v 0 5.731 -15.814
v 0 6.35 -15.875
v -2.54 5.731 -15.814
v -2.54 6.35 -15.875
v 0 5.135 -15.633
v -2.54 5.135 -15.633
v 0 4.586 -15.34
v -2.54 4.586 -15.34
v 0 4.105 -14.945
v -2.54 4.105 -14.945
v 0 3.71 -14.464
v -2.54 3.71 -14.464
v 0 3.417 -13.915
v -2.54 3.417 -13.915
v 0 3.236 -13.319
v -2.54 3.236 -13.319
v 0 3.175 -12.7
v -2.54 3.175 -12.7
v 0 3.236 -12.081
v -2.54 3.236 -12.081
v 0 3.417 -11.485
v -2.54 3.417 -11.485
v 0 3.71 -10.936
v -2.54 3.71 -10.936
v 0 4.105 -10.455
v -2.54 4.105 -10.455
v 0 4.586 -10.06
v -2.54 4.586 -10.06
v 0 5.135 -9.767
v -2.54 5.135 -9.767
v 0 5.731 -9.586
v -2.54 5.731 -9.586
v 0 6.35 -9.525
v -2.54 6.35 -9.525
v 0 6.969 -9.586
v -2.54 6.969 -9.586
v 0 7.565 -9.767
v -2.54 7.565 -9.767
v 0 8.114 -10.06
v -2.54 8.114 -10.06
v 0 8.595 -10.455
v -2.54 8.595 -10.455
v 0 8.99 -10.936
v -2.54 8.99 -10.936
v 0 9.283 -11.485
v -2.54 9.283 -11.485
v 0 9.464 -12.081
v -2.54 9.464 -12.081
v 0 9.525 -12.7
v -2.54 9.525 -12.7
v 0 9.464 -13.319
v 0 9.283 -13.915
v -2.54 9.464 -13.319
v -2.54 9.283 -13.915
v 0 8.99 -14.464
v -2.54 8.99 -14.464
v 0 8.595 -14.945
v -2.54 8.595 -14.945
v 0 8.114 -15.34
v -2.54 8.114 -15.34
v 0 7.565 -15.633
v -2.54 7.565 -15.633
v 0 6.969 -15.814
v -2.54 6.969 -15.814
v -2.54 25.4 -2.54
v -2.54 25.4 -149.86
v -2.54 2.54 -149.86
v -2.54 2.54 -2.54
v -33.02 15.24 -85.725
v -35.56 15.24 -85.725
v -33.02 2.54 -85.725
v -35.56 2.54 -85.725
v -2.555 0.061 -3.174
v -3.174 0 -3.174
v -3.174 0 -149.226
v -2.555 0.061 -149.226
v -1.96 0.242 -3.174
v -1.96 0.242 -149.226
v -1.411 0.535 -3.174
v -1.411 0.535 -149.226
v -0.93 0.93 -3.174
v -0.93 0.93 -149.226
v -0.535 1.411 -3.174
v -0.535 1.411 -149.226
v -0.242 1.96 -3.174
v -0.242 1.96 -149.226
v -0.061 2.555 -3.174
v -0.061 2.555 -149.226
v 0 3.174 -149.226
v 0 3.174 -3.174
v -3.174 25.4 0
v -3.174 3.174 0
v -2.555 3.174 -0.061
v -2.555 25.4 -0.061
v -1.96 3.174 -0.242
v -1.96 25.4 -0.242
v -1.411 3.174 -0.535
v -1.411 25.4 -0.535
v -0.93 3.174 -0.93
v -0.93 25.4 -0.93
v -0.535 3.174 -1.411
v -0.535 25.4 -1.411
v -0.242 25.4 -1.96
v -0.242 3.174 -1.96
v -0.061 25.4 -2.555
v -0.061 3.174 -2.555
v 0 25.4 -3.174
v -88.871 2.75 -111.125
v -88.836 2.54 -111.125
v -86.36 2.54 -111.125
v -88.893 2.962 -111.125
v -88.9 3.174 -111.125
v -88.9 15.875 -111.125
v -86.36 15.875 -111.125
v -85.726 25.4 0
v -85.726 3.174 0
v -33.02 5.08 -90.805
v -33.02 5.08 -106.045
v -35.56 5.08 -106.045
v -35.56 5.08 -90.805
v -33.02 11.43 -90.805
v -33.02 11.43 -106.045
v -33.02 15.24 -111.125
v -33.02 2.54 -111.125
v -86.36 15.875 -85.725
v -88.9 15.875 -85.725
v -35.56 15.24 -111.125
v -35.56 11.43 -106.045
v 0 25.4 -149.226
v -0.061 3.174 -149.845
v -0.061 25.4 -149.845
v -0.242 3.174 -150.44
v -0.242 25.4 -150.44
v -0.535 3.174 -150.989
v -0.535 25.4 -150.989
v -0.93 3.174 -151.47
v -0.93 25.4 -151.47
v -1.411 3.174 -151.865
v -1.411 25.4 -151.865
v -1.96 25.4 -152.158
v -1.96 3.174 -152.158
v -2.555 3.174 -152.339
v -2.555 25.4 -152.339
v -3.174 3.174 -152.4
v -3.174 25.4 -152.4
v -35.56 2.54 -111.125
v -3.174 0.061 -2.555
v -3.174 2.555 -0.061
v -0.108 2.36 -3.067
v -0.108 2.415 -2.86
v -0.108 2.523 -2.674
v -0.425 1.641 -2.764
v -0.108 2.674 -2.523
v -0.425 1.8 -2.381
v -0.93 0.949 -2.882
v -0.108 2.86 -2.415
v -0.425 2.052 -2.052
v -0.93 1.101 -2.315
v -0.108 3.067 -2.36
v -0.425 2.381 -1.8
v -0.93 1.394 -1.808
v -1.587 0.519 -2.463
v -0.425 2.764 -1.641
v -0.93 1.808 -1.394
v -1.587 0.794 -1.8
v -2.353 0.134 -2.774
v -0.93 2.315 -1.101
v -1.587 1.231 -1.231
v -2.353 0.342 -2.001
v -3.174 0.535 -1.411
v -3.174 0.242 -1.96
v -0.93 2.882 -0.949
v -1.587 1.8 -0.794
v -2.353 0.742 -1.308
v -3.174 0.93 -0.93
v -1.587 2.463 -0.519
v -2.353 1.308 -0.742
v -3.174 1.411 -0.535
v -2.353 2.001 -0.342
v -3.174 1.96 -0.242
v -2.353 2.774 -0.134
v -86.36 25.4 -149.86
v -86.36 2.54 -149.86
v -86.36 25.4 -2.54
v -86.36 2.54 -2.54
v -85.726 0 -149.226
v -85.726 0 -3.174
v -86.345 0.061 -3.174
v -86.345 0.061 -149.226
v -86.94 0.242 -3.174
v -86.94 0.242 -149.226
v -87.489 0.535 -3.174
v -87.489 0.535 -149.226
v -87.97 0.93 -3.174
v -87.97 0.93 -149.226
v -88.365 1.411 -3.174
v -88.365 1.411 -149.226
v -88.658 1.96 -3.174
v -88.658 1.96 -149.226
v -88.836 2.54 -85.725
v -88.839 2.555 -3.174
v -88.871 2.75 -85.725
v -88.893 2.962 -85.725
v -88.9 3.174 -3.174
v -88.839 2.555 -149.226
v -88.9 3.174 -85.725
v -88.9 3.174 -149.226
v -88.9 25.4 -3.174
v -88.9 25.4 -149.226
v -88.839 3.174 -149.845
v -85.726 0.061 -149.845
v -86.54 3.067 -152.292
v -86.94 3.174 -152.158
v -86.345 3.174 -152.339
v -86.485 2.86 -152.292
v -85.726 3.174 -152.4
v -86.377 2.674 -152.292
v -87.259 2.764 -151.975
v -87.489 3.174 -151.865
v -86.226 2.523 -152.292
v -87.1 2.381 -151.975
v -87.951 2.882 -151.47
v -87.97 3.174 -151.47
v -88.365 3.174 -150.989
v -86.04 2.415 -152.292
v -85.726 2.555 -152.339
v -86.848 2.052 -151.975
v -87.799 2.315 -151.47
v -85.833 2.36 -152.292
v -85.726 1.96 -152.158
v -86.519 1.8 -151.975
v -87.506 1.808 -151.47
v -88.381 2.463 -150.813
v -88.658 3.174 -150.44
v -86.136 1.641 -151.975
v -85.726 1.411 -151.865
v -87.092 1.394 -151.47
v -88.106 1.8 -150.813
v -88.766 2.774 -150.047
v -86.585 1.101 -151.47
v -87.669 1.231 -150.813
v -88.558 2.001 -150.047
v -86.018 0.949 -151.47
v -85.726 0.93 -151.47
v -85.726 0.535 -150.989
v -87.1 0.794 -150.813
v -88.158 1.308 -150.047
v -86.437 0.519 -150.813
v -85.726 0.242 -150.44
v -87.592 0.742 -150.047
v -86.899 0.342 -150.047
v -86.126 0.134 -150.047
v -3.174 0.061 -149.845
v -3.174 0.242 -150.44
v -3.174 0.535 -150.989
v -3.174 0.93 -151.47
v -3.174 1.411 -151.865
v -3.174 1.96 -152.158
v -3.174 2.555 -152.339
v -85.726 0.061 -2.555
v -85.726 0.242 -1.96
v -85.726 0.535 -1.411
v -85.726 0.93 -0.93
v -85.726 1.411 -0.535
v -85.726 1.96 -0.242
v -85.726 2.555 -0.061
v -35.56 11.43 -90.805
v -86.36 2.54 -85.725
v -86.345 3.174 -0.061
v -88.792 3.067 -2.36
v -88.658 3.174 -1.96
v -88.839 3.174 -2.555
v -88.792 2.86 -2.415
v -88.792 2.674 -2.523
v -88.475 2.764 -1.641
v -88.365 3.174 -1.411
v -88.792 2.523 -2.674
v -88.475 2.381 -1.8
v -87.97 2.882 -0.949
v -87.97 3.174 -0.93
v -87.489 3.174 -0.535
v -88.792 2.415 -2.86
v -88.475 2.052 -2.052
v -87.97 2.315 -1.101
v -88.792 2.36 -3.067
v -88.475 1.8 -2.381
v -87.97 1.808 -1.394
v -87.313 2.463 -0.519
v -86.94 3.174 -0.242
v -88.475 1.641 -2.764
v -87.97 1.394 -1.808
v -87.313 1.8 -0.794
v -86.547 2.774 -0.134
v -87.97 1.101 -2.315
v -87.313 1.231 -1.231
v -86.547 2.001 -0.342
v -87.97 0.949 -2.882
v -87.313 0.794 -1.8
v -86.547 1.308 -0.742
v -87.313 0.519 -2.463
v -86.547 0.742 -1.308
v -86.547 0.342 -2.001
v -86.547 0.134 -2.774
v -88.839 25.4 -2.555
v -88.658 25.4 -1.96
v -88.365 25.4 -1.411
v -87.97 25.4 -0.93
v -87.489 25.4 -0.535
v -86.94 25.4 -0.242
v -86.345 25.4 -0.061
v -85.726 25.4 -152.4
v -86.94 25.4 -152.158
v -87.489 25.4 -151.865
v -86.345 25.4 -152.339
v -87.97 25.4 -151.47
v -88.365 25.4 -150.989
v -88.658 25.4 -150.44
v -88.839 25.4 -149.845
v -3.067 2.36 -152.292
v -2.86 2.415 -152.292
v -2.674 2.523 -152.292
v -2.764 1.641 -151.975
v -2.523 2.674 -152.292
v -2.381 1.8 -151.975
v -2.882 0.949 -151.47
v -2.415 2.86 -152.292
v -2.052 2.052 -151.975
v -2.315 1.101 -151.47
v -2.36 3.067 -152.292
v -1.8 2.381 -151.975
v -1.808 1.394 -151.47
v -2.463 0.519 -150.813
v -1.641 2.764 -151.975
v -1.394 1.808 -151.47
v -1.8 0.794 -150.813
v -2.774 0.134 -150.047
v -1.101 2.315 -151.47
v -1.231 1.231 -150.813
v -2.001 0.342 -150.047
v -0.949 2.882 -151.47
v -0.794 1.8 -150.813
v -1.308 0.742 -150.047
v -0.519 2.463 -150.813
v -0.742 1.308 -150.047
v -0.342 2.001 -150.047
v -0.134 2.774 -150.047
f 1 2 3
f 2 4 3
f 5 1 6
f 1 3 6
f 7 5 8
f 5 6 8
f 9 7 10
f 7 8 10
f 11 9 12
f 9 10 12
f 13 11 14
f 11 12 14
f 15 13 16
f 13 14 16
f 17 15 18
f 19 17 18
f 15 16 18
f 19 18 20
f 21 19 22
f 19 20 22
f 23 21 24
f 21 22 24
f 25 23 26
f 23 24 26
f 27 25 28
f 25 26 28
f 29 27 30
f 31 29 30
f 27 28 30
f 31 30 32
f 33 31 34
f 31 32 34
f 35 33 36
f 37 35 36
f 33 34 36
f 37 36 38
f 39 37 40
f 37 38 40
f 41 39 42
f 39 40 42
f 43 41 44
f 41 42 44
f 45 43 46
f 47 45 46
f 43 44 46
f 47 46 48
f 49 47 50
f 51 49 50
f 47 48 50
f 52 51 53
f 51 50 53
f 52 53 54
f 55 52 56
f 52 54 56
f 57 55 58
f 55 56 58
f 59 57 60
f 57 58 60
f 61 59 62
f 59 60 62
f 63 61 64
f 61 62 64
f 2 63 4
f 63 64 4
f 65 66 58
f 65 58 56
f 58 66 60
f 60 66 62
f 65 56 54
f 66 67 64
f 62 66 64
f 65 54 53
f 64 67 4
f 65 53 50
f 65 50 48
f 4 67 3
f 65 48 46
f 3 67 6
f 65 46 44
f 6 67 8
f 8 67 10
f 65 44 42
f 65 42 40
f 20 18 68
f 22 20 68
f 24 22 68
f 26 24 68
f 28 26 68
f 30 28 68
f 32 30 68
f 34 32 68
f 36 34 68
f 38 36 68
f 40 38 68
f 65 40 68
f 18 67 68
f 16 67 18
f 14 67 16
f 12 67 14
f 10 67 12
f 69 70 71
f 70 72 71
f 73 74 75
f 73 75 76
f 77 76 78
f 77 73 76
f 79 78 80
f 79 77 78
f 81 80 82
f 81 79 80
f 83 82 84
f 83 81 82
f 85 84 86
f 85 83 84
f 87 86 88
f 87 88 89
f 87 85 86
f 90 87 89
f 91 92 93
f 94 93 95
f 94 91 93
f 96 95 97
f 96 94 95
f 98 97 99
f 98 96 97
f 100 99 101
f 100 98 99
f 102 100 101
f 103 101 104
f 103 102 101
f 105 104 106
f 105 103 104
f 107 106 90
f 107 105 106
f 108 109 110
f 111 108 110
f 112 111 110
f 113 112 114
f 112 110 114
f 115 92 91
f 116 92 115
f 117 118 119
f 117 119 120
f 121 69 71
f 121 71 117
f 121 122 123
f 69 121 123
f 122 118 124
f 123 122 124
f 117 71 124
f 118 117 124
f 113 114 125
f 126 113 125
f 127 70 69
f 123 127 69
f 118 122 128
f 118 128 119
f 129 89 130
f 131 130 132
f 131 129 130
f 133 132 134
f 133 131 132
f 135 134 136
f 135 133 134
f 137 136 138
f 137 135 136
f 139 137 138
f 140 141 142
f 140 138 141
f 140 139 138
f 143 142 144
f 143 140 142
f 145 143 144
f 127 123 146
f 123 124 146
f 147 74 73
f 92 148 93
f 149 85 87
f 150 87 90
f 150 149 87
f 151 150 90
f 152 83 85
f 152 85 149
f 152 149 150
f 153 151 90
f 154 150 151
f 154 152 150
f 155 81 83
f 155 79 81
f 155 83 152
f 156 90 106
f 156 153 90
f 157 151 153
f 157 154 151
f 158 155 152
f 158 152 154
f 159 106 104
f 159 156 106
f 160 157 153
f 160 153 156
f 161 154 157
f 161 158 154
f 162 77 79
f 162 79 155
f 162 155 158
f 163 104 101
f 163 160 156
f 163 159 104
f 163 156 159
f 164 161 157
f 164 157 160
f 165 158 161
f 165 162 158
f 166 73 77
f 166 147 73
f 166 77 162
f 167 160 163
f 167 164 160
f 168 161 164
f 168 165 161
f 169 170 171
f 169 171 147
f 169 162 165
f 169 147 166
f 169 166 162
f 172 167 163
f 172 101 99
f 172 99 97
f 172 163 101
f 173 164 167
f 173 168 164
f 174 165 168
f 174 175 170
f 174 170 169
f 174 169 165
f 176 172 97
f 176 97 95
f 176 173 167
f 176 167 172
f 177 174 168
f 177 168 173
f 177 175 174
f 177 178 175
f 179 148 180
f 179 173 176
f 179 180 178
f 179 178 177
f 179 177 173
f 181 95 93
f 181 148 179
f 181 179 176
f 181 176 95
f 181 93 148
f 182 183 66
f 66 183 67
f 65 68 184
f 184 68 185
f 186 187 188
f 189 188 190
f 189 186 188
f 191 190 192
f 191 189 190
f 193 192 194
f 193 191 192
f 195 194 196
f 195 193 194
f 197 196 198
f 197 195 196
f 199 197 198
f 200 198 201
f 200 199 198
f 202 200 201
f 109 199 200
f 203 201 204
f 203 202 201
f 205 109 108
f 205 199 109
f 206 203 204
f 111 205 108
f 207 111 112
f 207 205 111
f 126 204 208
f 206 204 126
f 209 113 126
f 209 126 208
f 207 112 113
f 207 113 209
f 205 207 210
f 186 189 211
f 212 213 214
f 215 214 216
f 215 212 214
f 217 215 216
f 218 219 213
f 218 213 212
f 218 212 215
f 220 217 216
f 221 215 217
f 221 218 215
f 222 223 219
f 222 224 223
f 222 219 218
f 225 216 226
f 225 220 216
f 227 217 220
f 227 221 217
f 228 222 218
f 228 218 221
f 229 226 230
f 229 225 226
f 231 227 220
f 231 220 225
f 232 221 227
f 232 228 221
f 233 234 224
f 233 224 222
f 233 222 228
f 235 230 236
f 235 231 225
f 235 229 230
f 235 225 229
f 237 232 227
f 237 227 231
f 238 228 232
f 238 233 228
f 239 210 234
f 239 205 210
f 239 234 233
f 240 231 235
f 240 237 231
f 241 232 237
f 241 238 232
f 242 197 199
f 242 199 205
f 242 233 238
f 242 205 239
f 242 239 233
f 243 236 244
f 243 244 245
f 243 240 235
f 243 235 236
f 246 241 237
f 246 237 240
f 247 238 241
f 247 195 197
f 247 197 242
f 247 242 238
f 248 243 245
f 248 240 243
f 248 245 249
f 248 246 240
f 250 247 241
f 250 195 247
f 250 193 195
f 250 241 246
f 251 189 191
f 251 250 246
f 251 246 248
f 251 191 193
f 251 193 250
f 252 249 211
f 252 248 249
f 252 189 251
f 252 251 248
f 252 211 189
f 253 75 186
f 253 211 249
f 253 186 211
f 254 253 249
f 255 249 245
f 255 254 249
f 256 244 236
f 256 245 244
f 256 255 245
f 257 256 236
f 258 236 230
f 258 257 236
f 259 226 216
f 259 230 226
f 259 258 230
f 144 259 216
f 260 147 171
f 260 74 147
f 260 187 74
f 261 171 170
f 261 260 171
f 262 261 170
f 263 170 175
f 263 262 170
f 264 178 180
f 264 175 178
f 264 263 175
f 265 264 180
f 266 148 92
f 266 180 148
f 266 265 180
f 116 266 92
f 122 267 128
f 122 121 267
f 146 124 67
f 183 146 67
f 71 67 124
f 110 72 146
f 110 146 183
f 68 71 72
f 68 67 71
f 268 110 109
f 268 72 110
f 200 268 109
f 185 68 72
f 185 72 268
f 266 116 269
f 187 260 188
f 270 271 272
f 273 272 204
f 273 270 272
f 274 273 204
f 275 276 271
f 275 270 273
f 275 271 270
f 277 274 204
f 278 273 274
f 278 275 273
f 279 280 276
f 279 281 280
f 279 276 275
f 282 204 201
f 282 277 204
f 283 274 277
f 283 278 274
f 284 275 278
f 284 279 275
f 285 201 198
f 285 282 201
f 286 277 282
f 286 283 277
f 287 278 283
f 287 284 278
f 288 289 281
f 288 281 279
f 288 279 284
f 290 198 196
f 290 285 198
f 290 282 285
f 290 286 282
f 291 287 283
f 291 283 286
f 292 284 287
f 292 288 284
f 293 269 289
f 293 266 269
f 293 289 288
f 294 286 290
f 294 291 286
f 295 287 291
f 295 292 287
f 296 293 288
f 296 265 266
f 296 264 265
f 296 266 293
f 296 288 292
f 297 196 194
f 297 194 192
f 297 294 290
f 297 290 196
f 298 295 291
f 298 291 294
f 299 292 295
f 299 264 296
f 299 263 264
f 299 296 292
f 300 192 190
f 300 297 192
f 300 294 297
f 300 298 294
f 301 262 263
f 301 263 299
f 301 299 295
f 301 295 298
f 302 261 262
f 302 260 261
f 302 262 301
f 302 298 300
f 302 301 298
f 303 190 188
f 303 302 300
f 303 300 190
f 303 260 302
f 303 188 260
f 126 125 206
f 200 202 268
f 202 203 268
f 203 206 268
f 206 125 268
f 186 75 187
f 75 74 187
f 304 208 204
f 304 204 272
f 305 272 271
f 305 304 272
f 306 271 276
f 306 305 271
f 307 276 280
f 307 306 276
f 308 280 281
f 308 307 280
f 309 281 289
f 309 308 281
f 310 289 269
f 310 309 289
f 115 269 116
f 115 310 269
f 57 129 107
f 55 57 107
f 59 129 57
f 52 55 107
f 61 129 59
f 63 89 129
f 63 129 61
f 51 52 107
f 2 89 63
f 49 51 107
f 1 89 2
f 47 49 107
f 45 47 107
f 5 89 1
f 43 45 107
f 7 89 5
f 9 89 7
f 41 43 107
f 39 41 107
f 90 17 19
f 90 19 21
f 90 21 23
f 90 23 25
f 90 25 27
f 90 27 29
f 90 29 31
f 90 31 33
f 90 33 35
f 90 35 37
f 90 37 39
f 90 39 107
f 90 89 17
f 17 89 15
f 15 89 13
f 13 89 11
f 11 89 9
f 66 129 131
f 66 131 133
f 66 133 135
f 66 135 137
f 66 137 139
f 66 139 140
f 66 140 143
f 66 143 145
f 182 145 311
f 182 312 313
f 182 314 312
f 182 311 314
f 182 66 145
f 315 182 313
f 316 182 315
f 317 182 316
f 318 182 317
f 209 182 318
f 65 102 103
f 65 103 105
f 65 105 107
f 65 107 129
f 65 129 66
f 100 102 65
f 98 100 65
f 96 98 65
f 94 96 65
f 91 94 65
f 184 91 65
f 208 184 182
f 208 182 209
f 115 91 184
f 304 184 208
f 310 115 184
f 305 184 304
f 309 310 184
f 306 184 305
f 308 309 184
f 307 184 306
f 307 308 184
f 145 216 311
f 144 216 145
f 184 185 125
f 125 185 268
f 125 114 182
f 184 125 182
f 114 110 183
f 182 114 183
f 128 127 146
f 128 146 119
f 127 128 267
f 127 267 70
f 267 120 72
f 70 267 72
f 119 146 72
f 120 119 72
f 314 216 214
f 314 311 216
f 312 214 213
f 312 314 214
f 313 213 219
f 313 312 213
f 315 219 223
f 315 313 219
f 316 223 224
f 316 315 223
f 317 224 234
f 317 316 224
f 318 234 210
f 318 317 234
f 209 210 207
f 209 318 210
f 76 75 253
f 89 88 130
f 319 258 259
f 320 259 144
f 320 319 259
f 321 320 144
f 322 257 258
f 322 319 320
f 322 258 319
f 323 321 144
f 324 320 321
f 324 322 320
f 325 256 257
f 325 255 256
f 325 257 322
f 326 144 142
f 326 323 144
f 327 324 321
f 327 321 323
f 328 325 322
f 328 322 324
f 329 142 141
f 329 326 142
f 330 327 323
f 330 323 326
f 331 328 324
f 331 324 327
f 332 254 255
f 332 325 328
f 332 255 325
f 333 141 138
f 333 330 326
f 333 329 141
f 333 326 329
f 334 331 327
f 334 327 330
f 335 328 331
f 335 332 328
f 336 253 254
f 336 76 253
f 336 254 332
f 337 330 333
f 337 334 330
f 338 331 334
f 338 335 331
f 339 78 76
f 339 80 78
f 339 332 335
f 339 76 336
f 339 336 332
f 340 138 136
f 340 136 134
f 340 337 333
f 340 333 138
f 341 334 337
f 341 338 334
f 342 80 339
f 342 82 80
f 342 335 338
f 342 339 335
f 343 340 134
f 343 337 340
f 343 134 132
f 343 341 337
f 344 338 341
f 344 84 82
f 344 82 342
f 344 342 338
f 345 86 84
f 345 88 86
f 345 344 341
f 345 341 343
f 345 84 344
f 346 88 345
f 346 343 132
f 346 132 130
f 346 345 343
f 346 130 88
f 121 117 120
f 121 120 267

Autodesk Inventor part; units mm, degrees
ref_plane "YZ Plane" through (0, 0, 0) normal (1, 0, 0) x (0, 1, 0)
ref_plane "XZ Plane" through (0, 0, 0) normal (0, 1, 0) x (-1, 0, 0)
ref_plane "XY Plane" through (0, 0, 0) normal (0, 0, 1) x (1, 0, 0)
sketch "Sketch1" plane through (0, 0, 0) normal (0, 1, 0) x (-1, 0, 0)
  line L0 (0, 0) -> (88.9, 0)
  line L1 (88.9, 0) -> (88.9, -152.4)
  line L2 (88.9, -152.4) -> (0, -152.4)
  line L3 (0, -152.4) -> (0, 0)
  dimension "d0" = 88.9
  dimension "d1" = 152.4
extrude "Extrusion1" add sketch "Sketch1" along normal blind 25.4
shell "Shell1" thickness 2.54 removed faces 1 at (-59.2667, 25.4, -101.6)
sketch "Sketch2" plane through (-86.36, 2.54, -149.86) normal (1, 0, 0) x (0, 0, -1)
  point P0 (-149.86, -2.54)
sketch "Sketch7" plane through (0, 0, 0) normal (1, 0, 0) x (0, 0, -1)
  line L0 (152.4, 0) -> (0, 0) projected
  line L1 (0, 0) -> (0, 6.35)
  line L2 (0, 0) -> (0, 25.4) projected
  line L3 (0, 6.35) -> (12.7, 6.35)
  dimension "d21" = 6.35
  dimension "d22" = 12.7
  dimension "d23" = 90
hole "Hole1" at (0, 6.35, -12.7) direction (-1, 0, 0) diameter 6.35 depth 2.54 tip angle 118
fillet "Fillet2" radius 3.175 8 edges at (-44.45, 0, 0) (0, 12.7, 0) (0, 0, -76.2) (-88.9, 12.7, 0) (-88.9, 0, -76.2) (-44.45, 0, -152.4) (-88.9, 12.7, -152.4) (0, 12.7, -152.4)
sketch "Sketch9" plane through (-86.36, 2.54, -149.86) normal (1, 0, 0) x (0, 0, -1)
  line L0 (-0.635, 0.635) -> (-0.635, 22.86) projected
  line L1 (-0.635, 0.635) -> (-38.735, 0.635)
  line L2 (0, 0) -> (-147.32, 0) projected
  line L3 (-0.635, 0.635) -> (37.465, 0.635) construction
  line L4 (-38.735, 0.635) -> (-64.135, 0.635)
  line L5 (-64.135, 0.635) -> (-38.735, 0.635)
  line L6 (-38.735, 0.635) -> (-38.735, 13.335)
  line L7 (-38.735, 13.335) -> (-64.135, 13.335)
  line L8 (-64.135, 13.335) -> (-64.135, 0.635)
  point P0 (-149.86, -2.54)
  point P1 (-38.735, 0.635)
  dimension "d39" = 38.1
  dimension "d40" = 180
  dimension "d41" = 25.4
  dimension "d42" = 180
  dimension "d43" = 25.4
  dimension "d44" = 12.7
extrude "Extrusion7" cut sketch "Sketch9" against normal blind 5.08
sketch "Sketch10" plane through (-86.36, 2.54, -149.86) normal (1, 0, 0) x (0, 0, -1)
  line L0 (-38.735, 13.335) -> (-38.735, 0.635) projected
  line L1 (-38.735, 0.635) -> (-64.135, 0.635)
  line L2 (-64.135, 0.635) -> (-64.135, 0)
  line L3 (-64.135, 0) -> (-38.735, 0)
  line L4 (-38.735, 0) -> (-38.735, 0.635)
  point P0 (-149.86, -2.54)
  dimension "d47" = 25.4
  dimension "d48" = 0.635
extrude "Extrusion8" cut sketch "Sketch10" against normal blind 5.08
sketch "Sketch11" plane through (-86.36, 2.54, -149.86) normal (0, 1, 0) x (1, 0, 0)
  line L0 (0, -64.135) -> (-2.4759, -64.135) projected
  line L1 (0, -64.135) -> (50.8, -64.135)
  line L2 (0, -64.135) -> (50.8, -64.135) construction
  line L3 (50.8, -64.135) -> (53.34, -64.135)
  line L4 (53.34, -64.135) -> (53.34, -38.735)
  line L5 (53.34, -38.735) -> (50.8, -38.735)
  line L6 (50.8, -38.735) -> (50.8, -64.135)
  point P0 (86.36, -149.86)
  dimension "d51" = 50.8
  dimension "d52" = 0
  dimension "d53" = 2.54
  dimension "d54" = 25.4
extrude "Extrusion9" add sketch "Sketch11" along normal blind 12.7
sketch "Sketch12" plane through (-33.02, 2.54, -85.725) normal (1, 0, 0) x (0, 0, -1)
  line L0 (0, 0) -> (5.08, 0)
  line L1 (25.4, 0) -> (0, 0) projected
  line L2 (0, 0) -> (5.08, 0) construction
  line L3 (25.4, 0) -> (20.32, 0)
  line L4 (25.4, 0) -> (30.48, 0) construction
  line L5 (20.32, 0) -> (20.32, 2.54)
  line L6 (0, 0) -> (25.4, 0) projected
  line L7 (20.32, 0) -> (22.86, 0) construction
  line L8 (20.32, 2.54) -> (5.08, 2.54)
  line L9 (5.08, 2.54) -> (5.08, 8.89)
  line L10 (5.08, 8.89) -> (20.32, 8.89)
  line L11 (20.32, 8.89) -> (20.32, 2.54)
  point P0 (-85.725, -2.54)
  dimension "d57" = 5.08
  dimension "d58" = 0
  dimension "d59" = 5.08
  dimension "d60" = 180
  dimension "d61" = 2.54
  dimension "d62" = 90
  dimension "d63" = 15.24
  dimension "d64" = 6.35
extrude "Extrusion10" cut sketch "Sketch12" against normal blind 12.7
properties part number "OuterCase"
